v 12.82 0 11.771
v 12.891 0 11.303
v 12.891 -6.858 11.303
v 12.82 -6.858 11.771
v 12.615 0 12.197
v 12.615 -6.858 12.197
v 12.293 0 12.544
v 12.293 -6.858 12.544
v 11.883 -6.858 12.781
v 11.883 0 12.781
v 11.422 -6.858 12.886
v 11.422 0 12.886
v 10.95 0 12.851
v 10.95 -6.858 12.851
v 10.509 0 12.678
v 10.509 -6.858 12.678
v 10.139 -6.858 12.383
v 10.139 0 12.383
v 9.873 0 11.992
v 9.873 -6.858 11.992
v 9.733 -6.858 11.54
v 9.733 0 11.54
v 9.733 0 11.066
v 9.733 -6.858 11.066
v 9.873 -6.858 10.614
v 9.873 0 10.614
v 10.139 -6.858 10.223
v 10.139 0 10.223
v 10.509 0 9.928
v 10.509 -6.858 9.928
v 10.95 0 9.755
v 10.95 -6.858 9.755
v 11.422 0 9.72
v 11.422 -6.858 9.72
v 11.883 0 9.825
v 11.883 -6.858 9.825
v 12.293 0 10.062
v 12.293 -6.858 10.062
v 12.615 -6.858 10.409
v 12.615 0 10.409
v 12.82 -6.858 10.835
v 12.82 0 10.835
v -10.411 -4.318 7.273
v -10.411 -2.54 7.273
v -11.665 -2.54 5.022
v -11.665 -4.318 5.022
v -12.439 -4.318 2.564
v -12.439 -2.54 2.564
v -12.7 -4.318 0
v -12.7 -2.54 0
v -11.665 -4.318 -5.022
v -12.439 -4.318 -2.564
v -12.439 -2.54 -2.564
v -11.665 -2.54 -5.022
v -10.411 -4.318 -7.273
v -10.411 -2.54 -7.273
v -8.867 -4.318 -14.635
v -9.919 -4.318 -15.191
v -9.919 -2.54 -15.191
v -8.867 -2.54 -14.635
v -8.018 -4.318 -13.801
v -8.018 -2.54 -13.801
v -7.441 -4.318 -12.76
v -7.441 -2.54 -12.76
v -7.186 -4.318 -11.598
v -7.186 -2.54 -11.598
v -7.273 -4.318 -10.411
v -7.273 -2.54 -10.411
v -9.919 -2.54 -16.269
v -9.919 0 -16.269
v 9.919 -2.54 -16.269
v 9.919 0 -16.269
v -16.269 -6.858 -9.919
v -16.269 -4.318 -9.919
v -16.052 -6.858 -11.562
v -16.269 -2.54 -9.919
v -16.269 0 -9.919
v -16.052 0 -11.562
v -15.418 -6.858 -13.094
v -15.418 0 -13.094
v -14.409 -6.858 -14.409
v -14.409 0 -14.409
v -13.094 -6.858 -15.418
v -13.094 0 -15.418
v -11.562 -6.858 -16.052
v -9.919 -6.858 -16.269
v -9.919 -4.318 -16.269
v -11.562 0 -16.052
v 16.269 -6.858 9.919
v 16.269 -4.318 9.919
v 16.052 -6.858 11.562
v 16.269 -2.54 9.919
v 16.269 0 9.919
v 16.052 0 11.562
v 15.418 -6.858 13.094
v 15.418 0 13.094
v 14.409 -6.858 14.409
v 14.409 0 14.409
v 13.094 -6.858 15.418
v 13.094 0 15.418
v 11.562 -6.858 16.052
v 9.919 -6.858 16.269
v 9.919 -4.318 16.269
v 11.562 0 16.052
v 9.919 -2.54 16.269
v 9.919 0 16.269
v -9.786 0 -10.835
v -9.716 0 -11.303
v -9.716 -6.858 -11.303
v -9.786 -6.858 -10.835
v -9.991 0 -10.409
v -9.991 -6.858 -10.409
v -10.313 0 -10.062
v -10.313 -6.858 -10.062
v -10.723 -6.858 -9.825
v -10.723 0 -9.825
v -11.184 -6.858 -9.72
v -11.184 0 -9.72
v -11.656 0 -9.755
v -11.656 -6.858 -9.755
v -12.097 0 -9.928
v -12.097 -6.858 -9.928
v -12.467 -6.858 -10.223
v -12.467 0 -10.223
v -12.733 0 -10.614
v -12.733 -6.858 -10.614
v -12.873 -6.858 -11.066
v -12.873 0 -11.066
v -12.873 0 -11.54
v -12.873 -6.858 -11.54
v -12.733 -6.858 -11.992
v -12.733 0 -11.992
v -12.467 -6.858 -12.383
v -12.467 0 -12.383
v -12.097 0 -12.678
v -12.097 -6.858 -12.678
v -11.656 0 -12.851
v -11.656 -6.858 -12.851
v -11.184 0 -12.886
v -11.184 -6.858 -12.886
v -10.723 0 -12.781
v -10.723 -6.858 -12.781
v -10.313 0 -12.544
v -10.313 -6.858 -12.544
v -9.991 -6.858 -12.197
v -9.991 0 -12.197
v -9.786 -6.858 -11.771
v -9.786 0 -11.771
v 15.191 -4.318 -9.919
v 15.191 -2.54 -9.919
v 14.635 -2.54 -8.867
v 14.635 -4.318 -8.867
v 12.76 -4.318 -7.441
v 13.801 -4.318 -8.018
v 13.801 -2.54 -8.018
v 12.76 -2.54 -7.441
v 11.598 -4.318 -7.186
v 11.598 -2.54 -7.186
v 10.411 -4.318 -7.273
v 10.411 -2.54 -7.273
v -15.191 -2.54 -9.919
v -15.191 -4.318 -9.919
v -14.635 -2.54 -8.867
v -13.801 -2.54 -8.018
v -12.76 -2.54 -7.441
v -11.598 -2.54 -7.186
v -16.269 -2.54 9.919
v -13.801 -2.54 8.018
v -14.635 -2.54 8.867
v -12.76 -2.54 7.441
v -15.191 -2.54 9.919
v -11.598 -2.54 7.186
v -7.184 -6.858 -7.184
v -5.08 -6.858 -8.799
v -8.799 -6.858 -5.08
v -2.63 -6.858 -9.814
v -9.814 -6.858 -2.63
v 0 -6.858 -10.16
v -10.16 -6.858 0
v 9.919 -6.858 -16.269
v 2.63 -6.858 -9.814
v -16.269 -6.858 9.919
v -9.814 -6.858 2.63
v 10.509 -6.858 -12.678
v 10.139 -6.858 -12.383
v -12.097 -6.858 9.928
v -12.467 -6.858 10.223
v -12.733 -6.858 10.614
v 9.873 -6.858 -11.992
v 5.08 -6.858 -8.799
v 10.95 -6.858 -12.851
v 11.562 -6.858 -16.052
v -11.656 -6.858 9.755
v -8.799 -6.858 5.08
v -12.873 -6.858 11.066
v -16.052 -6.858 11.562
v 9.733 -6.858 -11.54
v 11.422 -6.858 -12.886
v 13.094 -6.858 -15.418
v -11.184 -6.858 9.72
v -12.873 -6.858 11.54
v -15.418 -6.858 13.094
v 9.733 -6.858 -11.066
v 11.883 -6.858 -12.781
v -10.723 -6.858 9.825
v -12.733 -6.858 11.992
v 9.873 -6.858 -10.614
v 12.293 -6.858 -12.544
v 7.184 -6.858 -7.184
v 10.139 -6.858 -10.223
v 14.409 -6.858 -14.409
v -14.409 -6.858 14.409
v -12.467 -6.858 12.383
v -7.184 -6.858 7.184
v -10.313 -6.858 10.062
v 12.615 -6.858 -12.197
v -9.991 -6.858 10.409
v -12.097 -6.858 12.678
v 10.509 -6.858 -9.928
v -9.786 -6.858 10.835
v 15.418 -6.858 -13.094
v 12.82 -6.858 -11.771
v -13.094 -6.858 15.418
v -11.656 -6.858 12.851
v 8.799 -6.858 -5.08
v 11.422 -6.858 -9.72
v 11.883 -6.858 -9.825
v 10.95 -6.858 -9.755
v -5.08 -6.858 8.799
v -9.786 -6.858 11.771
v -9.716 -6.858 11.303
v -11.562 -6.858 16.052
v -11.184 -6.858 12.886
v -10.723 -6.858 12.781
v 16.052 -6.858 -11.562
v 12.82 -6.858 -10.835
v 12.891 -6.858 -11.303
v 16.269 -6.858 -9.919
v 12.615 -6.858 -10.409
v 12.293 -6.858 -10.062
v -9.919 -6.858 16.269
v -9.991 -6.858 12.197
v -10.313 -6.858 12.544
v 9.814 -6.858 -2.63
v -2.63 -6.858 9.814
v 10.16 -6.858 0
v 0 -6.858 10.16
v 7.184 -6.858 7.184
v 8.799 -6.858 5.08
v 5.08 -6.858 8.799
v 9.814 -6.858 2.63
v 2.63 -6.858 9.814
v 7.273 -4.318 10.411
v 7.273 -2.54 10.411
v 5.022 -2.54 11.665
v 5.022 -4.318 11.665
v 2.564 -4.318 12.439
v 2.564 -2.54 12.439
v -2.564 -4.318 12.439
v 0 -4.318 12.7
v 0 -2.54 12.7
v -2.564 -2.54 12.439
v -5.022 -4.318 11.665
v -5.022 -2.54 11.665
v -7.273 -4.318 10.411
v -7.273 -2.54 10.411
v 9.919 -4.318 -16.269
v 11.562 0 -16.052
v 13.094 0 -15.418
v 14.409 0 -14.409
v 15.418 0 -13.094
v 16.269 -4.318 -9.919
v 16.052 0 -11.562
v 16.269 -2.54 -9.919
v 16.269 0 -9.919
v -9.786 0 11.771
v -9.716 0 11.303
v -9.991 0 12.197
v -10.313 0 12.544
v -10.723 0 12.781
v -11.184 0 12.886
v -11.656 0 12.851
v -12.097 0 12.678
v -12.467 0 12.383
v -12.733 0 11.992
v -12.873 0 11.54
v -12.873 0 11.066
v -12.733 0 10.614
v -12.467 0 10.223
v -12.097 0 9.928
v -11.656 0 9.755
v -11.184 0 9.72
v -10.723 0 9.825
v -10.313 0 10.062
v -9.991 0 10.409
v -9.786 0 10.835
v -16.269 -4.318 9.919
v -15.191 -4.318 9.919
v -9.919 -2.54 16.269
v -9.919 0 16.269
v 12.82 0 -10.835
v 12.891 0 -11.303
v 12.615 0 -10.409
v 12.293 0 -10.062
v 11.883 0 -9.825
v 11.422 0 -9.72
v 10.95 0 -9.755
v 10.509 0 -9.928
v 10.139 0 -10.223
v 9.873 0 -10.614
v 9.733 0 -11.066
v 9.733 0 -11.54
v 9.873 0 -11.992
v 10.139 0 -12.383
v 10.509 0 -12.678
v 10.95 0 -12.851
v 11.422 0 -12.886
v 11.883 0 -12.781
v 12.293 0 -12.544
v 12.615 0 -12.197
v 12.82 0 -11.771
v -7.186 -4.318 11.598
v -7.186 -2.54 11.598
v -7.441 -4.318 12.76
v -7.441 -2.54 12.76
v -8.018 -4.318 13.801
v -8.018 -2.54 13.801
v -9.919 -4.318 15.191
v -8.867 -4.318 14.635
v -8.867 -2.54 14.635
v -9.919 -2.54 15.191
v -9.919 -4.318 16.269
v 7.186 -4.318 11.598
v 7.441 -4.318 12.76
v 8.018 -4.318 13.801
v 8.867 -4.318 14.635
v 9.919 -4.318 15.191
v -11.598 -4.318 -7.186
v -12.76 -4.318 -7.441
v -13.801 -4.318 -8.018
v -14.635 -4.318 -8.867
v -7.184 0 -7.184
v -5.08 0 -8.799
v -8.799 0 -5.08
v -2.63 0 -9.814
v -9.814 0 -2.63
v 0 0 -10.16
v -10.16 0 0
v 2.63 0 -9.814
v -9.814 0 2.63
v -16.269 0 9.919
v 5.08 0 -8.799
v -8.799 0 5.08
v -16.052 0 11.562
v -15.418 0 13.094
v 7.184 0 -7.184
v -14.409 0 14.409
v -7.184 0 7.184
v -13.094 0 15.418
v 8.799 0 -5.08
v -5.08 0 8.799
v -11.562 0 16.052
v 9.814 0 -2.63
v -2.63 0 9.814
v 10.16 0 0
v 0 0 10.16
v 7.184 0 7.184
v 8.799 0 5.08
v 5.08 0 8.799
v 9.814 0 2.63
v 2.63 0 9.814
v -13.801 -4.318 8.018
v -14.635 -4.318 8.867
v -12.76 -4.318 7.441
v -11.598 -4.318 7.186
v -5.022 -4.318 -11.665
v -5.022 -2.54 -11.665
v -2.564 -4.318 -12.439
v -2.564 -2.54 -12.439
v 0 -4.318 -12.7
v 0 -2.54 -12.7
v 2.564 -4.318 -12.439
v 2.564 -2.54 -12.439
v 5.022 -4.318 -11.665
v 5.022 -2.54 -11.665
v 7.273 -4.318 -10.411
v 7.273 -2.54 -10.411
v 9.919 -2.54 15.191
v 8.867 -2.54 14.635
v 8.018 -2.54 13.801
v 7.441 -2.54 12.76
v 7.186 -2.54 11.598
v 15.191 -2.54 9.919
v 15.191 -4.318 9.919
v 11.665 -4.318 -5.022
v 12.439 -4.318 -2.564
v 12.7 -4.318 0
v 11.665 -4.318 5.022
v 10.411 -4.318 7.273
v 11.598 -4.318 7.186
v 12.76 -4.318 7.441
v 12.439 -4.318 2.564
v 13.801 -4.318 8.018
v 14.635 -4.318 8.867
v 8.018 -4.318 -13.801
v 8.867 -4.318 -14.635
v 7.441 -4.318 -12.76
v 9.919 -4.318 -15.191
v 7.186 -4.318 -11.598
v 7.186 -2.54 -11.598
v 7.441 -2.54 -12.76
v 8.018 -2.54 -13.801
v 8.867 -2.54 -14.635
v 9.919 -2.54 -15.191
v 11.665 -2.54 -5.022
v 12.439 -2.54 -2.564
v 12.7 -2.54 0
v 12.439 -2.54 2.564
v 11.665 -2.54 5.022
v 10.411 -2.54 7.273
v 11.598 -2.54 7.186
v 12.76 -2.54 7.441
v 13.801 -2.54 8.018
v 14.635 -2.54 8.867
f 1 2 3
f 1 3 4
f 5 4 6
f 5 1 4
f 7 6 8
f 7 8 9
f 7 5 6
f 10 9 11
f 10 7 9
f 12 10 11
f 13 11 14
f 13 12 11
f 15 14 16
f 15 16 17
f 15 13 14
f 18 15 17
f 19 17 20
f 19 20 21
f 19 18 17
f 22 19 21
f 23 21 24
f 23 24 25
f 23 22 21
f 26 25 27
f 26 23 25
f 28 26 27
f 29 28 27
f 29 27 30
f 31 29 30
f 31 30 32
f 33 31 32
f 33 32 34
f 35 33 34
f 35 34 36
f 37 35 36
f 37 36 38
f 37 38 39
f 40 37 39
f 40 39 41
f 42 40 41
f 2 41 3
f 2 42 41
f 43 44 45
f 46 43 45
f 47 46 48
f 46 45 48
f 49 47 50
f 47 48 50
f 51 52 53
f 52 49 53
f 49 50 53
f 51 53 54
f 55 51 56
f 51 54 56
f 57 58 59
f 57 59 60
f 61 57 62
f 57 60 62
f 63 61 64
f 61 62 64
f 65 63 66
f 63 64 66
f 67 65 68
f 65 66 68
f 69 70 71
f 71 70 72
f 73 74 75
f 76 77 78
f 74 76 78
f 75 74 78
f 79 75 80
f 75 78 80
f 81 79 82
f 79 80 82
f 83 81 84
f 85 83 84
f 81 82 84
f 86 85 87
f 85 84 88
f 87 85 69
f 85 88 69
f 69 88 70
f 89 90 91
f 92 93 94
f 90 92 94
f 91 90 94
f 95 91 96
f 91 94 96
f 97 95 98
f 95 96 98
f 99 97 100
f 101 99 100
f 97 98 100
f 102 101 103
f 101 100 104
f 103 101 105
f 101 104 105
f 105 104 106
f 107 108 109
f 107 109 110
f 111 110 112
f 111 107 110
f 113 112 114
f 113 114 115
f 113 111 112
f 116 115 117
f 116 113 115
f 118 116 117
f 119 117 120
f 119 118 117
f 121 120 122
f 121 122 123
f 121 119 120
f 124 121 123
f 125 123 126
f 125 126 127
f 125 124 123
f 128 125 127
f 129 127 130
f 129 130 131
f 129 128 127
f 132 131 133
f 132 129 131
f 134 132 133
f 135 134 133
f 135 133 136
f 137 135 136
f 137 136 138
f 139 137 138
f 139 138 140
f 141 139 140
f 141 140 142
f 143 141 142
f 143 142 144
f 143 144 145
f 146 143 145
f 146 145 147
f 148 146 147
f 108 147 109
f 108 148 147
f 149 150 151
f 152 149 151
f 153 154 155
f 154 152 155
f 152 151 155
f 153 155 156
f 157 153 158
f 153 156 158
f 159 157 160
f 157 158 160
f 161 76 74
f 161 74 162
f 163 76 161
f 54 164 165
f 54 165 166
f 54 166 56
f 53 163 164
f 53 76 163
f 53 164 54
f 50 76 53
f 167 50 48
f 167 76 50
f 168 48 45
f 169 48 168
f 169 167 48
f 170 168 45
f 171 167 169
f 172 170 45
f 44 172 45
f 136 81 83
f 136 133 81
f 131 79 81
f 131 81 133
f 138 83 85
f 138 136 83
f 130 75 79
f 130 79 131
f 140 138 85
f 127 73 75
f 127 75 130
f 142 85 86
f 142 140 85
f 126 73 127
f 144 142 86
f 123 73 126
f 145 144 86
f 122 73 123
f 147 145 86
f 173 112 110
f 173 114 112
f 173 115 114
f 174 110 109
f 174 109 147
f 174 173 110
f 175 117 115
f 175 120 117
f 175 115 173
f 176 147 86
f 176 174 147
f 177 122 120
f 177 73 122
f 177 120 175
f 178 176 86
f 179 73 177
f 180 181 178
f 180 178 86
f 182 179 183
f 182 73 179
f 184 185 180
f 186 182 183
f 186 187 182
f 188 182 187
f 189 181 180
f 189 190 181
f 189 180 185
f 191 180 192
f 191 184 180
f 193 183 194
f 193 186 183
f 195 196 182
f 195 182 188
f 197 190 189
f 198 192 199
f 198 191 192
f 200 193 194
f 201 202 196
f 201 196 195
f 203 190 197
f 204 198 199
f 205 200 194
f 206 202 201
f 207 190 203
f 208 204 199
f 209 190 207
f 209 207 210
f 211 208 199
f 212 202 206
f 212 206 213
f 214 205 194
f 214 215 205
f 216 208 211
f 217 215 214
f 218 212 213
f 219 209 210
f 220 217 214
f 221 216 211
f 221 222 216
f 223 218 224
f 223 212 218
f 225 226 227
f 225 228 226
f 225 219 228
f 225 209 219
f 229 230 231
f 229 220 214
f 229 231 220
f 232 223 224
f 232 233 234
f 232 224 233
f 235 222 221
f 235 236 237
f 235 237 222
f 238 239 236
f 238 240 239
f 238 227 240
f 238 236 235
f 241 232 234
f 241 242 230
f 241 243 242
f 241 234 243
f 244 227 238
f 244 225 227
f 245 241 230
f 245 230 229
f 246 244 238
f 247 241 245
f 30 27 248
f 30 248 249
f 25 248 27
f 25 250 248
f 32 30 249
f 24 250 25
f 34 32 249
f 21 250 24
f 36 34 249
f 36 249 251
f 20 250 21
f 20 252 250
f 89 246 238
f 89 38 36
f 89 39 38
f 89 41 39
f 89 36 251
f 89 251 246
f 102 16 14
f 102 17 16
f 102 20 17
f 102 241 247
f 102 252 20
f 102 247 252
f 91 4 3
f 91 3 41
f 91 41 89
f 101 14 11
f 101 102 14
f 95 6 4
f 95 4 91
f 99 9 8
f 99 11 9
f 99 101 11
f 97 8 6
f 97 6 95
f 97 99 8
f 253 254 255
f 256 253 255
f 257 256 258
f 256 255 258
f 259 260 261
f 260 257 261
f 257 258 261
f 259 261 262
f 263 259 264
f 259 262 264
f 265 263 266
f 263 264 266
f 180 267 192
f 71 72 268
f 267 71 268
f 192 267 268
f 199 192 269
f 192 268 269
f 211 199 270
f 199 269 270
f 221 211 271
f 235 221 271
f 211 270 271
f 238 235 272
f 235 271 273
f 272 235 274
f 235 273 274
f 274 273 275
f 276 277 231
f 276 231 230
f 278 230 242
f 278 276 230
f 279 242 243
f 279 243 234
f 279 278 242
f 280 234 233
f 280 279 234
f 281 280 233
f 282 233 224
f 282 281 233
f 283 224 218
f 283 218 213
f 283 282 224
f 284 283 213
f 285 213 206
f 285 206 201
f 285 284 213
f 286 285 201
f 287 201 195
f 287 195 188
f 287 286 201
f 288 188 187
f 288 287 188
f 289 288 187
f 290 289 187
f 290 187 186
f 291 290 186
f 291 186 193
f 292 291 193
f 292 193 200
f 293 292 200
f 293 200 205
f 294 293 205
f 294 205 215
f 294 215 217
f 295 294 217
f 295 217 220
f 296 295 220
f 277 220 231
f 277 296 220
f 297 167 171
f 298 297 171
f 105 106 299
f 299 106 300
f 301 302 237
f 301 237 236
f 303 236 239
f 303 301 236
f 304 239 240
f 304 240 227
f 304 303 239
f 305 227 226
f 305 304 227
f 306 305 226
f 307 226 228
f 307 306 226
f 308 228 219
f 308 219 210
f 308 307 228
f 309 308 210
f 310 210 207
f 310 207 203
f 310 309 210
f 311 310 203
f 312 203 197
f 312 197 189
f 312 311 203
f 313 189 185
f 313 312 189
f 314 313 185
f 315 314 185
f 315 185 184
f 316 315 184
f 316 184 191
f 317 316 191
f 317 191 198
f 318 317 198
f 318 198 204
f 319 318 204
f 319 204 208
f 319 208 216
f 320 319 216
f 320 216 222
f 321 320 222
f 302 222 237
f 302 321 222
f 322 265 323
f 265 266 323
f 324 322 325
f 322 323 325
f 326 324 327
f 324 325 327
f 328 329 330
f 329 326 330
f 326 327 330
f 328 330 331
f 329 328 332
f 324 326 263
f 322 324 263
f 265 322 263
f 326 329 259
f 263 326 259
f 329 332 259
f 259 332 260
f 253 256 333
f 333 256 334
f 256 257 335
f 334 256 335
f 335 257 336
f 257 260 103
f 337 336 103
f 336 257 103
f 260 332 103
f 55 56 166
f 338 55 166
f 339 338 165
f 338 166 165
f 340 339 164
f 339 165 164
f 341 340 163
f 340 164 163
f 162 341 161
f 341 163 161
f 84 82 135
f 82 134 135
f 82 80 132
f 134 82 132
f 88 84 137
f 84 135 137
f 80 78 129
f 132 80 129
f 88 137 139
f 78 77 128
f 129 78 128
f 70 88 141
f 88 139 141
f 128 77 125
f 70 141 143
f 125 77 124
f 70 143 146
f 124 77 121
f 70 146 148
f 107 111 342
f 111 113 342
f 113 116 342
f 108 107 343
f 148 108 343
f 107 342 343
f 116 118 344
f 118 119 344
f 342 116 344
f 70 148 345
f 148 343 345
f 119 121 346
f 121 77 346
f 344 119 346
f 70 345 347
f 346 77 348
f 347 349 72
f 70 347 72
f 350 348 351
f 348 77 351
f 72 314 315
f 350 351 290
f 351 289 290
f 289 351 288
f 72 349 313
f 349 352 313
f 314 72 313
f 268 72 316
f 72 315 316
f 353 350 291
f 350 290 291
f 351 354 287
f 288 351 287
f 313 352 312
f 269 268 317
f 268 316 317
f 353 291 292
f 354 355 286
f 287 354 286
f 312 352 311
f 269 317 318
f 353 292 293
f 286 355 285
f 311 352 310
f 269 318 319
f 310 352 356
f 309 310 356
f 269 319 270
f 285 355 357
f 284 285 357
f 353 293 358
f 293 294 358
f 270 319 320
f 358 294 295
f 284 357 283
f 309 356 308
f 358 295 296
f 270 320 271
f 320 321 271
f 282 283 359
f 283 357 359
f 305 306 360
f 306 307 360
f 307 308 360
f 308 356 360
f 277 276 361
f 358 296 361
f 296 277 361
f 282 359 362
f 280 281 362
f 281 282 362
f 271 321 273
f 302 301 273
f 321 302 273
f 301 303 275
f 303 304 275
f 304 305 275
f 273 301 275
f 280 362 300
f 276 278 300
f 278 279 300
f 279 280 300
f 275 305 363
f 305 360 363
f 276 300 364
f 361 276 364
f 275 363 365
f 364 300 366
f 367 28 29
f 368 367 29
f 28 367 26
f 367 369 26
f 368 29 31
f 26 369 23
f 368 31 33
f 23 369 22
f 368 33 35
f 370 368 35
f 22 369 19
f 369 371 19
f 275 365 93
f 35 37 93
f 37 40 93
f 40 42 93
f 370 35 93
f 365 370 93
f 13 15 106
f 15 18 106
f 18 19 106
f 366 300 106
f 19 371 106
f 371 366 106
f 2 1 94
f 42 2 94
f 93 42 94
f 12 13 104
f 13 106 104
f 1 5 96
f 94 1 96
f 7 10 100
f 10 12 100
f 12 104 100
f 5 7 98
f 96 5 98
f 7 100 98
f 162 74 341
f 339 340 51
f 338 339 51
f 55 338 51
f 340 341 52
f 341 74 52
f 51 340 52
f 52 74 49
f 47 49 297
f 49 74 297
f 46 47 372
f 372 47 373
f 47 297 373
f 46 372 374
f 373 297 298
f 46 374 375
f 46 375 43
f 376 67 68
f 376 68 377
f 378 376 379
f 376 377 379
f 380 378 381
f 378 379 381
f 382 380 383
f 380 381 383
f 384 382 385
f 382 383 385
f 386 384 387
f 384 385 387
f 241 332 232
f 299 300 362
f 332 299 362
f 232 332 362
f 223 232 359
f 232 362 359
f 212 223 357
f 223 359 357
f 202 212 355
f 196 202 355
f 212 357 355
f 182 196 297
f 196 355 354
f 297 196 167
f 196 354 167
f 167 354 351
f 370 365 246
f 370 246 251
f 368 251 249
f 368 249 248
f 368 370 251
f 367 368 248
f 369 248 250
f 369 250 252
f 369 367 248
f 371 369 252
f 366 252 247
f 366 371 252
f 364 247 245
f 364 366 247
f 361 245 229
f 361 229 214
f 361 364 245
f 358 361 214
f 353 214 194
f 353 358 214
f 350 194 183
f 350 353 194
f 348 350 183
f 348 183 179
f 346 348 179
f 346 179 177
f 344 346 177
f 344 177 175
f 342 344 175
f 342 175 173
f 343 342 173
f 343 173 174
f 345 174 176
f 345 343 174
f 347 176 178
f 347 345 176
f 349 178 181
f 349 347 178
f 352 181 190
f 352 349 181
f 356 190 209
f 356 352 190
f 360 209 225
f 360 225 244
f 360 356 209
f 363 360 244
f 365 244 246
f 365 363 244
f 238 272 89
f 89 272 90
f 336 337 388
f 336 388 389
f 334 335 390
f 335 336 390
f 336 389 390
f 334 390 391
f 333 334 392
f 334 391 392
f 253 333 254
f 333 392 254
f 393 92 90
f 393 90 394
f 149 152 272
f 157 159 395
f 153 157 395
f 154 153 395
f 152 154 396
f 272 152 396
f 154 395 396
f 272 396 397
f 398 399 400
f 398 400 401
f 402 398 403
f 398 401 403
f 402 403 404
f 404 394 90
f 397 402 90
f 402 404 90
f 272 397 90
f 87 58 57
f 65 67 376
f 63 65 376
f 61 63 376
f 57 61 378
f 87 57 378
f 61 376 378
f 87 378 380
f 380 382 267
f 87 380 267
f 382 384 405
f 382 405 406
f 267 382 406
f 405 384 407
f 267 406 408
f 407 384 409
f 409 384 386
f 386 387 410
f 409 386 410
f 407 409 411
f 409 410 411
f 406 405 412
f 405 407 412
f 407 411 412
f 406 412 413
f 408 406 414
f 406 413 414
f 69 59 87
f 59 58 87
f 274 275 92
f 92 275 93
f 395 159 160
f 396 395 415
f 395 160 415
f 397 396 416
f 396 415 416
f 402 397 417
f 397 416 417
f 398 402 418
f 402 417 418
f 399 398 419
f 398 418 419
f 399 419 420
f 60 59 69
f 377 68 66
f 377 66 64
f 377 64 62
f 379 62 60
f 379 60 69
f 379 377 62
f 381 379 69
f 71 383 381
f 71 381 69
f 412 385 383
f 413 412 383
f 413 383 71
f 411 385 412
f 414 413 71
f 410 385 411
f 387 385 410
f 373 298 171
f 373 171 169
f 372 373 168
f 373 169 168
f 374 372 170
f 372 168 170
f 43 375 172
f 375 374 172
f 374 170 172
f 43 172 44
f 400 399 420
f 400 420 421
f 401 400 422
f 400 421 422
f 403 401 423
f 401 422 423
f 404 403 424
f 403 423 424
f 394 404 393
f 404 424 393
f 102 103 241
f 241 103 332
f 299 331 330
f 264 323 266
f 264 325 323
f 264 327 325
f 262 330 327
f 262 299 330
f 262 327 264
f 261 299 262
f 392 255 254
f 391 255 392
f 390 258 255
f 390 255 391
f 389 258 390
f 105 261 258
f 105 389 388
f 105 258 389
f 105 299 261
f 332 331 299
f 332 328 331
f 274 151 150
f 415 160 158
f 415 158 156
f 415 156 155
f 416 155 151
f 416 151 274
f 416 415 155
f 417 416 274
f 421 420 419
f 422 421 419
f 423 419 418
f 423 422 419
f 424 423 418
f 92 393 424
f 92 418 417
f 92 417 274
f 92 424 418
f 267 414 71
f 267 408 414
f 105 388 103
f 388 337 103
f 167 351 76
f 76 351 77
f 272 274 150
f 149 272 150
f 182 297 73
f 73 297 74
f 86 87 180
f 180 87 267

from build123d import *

# Parameters (mm, degrees)
F0_R     = 1.5875
F0_R_2   = 10.16
F1_DEPTH = 6.858
F2_T     = 2.54


# Not quite as in the source:
# - a shell that OpenCascade refuses in one call is made with other operations: the cavity is built on its own and cut out


with BuildPart() as f1:
    # F0 (on Front) → F1 (new body)
    with BuildSketch(Plane.XZ):
        with BuildLine():
            Line((9.9187, 16.2687), (-9.9187, 16.2687))
            ThreePointArc((-9.9187, 16.2687), (-14.4088280605, 14.4088280605), (-16.2687, 9.9187))
            Line((-16.2687, 9.9187), (-16.2687, -9.9187))
            ThreePointArc((-16.2687, -9.9187), (-14.4088280605, -14.4088280605), (-9.9187, -16.2687))
            Line((-9.9187, -16.2687), (9.9187, -16.2687))
            ThreePointArc((9.9187, -16.2687), (14.4088280605, -14.4088280605), (16.2687, -9.9187))
            Line((16.2687, -9.9187), (16.2687, 9.9187))
            ThreePointArc((16.2687, 9.9187), (14.4088280605, 14.4088280605), (9.9187, 16.2687))
        make_face()
        with Locations((-11.303, -11.303)):
            Circle(F0_R, mode=Mode.SUBTRACT)
        with Locations((11.303, -11.303)):
            Circle(F0_R, mode=Mode.SUBTRACT)
        with Locations((-11.303, 11.303)):
            Circle(F0_R, mode=Mode.SUBTRACT)
        Circle(F0_R_2, mode=Mode.SUBTRACT)
        with Locations((11.303, 11.303)):
            Circle(F0_R, mode=Mode.SUBTRACT)
    extrude(amount=F1_DEPTH)

    # F2: shell of thickness 2.54, made by hand


with BuildPart() as f2_core1:
    # F2_t2: copy of F1
    add(f1.part)

    # the walls: a layer under each face that stays
    f2_faces = [f2_core1.faces().sort_by_distance(p)[0] for p in [
        (-14.4088280605, -3.429, 14.4088280605),
        (-14.4088280605, -3.429, -14.4088280605),
        (14.4088280605, -3.429, -14.4088280605),
        (14.4088280605, -3.429, 14.4088280605),
        (-12.8905, -3.429, -11.303),
        (9.7155, -3.429, -11.303),
        (-12.8905, -3.429, 11.303),
        (-10.16, -3.429, 0),
        (9.7155, -3.429, 11.303),
        (-10.8458, 0, 0),
        (-10.8458, -6.858, 0),
    ]]
    thicken(f2_faces, amount=-F2_T, mode=Mode.SUBTRACT)


with BuildPart() as f1_1:
    add(f1.part)

    # what is left inside the walls is the cavity
    f2_cavity = [f2_core1.part.solids().sort_by_distance(p)[0] for p in [
        (-4.95935, -4.2926, 14.316209),
        (13.339963, -4.2926, -3.306233),
        (-13.339963, -4.2926, -3.306233),
        (0, -2.5654, -14.316209),
    ]]
    add(f2_cavity, mode=Mode.SUBTRACT)


solid = f1_1.part
